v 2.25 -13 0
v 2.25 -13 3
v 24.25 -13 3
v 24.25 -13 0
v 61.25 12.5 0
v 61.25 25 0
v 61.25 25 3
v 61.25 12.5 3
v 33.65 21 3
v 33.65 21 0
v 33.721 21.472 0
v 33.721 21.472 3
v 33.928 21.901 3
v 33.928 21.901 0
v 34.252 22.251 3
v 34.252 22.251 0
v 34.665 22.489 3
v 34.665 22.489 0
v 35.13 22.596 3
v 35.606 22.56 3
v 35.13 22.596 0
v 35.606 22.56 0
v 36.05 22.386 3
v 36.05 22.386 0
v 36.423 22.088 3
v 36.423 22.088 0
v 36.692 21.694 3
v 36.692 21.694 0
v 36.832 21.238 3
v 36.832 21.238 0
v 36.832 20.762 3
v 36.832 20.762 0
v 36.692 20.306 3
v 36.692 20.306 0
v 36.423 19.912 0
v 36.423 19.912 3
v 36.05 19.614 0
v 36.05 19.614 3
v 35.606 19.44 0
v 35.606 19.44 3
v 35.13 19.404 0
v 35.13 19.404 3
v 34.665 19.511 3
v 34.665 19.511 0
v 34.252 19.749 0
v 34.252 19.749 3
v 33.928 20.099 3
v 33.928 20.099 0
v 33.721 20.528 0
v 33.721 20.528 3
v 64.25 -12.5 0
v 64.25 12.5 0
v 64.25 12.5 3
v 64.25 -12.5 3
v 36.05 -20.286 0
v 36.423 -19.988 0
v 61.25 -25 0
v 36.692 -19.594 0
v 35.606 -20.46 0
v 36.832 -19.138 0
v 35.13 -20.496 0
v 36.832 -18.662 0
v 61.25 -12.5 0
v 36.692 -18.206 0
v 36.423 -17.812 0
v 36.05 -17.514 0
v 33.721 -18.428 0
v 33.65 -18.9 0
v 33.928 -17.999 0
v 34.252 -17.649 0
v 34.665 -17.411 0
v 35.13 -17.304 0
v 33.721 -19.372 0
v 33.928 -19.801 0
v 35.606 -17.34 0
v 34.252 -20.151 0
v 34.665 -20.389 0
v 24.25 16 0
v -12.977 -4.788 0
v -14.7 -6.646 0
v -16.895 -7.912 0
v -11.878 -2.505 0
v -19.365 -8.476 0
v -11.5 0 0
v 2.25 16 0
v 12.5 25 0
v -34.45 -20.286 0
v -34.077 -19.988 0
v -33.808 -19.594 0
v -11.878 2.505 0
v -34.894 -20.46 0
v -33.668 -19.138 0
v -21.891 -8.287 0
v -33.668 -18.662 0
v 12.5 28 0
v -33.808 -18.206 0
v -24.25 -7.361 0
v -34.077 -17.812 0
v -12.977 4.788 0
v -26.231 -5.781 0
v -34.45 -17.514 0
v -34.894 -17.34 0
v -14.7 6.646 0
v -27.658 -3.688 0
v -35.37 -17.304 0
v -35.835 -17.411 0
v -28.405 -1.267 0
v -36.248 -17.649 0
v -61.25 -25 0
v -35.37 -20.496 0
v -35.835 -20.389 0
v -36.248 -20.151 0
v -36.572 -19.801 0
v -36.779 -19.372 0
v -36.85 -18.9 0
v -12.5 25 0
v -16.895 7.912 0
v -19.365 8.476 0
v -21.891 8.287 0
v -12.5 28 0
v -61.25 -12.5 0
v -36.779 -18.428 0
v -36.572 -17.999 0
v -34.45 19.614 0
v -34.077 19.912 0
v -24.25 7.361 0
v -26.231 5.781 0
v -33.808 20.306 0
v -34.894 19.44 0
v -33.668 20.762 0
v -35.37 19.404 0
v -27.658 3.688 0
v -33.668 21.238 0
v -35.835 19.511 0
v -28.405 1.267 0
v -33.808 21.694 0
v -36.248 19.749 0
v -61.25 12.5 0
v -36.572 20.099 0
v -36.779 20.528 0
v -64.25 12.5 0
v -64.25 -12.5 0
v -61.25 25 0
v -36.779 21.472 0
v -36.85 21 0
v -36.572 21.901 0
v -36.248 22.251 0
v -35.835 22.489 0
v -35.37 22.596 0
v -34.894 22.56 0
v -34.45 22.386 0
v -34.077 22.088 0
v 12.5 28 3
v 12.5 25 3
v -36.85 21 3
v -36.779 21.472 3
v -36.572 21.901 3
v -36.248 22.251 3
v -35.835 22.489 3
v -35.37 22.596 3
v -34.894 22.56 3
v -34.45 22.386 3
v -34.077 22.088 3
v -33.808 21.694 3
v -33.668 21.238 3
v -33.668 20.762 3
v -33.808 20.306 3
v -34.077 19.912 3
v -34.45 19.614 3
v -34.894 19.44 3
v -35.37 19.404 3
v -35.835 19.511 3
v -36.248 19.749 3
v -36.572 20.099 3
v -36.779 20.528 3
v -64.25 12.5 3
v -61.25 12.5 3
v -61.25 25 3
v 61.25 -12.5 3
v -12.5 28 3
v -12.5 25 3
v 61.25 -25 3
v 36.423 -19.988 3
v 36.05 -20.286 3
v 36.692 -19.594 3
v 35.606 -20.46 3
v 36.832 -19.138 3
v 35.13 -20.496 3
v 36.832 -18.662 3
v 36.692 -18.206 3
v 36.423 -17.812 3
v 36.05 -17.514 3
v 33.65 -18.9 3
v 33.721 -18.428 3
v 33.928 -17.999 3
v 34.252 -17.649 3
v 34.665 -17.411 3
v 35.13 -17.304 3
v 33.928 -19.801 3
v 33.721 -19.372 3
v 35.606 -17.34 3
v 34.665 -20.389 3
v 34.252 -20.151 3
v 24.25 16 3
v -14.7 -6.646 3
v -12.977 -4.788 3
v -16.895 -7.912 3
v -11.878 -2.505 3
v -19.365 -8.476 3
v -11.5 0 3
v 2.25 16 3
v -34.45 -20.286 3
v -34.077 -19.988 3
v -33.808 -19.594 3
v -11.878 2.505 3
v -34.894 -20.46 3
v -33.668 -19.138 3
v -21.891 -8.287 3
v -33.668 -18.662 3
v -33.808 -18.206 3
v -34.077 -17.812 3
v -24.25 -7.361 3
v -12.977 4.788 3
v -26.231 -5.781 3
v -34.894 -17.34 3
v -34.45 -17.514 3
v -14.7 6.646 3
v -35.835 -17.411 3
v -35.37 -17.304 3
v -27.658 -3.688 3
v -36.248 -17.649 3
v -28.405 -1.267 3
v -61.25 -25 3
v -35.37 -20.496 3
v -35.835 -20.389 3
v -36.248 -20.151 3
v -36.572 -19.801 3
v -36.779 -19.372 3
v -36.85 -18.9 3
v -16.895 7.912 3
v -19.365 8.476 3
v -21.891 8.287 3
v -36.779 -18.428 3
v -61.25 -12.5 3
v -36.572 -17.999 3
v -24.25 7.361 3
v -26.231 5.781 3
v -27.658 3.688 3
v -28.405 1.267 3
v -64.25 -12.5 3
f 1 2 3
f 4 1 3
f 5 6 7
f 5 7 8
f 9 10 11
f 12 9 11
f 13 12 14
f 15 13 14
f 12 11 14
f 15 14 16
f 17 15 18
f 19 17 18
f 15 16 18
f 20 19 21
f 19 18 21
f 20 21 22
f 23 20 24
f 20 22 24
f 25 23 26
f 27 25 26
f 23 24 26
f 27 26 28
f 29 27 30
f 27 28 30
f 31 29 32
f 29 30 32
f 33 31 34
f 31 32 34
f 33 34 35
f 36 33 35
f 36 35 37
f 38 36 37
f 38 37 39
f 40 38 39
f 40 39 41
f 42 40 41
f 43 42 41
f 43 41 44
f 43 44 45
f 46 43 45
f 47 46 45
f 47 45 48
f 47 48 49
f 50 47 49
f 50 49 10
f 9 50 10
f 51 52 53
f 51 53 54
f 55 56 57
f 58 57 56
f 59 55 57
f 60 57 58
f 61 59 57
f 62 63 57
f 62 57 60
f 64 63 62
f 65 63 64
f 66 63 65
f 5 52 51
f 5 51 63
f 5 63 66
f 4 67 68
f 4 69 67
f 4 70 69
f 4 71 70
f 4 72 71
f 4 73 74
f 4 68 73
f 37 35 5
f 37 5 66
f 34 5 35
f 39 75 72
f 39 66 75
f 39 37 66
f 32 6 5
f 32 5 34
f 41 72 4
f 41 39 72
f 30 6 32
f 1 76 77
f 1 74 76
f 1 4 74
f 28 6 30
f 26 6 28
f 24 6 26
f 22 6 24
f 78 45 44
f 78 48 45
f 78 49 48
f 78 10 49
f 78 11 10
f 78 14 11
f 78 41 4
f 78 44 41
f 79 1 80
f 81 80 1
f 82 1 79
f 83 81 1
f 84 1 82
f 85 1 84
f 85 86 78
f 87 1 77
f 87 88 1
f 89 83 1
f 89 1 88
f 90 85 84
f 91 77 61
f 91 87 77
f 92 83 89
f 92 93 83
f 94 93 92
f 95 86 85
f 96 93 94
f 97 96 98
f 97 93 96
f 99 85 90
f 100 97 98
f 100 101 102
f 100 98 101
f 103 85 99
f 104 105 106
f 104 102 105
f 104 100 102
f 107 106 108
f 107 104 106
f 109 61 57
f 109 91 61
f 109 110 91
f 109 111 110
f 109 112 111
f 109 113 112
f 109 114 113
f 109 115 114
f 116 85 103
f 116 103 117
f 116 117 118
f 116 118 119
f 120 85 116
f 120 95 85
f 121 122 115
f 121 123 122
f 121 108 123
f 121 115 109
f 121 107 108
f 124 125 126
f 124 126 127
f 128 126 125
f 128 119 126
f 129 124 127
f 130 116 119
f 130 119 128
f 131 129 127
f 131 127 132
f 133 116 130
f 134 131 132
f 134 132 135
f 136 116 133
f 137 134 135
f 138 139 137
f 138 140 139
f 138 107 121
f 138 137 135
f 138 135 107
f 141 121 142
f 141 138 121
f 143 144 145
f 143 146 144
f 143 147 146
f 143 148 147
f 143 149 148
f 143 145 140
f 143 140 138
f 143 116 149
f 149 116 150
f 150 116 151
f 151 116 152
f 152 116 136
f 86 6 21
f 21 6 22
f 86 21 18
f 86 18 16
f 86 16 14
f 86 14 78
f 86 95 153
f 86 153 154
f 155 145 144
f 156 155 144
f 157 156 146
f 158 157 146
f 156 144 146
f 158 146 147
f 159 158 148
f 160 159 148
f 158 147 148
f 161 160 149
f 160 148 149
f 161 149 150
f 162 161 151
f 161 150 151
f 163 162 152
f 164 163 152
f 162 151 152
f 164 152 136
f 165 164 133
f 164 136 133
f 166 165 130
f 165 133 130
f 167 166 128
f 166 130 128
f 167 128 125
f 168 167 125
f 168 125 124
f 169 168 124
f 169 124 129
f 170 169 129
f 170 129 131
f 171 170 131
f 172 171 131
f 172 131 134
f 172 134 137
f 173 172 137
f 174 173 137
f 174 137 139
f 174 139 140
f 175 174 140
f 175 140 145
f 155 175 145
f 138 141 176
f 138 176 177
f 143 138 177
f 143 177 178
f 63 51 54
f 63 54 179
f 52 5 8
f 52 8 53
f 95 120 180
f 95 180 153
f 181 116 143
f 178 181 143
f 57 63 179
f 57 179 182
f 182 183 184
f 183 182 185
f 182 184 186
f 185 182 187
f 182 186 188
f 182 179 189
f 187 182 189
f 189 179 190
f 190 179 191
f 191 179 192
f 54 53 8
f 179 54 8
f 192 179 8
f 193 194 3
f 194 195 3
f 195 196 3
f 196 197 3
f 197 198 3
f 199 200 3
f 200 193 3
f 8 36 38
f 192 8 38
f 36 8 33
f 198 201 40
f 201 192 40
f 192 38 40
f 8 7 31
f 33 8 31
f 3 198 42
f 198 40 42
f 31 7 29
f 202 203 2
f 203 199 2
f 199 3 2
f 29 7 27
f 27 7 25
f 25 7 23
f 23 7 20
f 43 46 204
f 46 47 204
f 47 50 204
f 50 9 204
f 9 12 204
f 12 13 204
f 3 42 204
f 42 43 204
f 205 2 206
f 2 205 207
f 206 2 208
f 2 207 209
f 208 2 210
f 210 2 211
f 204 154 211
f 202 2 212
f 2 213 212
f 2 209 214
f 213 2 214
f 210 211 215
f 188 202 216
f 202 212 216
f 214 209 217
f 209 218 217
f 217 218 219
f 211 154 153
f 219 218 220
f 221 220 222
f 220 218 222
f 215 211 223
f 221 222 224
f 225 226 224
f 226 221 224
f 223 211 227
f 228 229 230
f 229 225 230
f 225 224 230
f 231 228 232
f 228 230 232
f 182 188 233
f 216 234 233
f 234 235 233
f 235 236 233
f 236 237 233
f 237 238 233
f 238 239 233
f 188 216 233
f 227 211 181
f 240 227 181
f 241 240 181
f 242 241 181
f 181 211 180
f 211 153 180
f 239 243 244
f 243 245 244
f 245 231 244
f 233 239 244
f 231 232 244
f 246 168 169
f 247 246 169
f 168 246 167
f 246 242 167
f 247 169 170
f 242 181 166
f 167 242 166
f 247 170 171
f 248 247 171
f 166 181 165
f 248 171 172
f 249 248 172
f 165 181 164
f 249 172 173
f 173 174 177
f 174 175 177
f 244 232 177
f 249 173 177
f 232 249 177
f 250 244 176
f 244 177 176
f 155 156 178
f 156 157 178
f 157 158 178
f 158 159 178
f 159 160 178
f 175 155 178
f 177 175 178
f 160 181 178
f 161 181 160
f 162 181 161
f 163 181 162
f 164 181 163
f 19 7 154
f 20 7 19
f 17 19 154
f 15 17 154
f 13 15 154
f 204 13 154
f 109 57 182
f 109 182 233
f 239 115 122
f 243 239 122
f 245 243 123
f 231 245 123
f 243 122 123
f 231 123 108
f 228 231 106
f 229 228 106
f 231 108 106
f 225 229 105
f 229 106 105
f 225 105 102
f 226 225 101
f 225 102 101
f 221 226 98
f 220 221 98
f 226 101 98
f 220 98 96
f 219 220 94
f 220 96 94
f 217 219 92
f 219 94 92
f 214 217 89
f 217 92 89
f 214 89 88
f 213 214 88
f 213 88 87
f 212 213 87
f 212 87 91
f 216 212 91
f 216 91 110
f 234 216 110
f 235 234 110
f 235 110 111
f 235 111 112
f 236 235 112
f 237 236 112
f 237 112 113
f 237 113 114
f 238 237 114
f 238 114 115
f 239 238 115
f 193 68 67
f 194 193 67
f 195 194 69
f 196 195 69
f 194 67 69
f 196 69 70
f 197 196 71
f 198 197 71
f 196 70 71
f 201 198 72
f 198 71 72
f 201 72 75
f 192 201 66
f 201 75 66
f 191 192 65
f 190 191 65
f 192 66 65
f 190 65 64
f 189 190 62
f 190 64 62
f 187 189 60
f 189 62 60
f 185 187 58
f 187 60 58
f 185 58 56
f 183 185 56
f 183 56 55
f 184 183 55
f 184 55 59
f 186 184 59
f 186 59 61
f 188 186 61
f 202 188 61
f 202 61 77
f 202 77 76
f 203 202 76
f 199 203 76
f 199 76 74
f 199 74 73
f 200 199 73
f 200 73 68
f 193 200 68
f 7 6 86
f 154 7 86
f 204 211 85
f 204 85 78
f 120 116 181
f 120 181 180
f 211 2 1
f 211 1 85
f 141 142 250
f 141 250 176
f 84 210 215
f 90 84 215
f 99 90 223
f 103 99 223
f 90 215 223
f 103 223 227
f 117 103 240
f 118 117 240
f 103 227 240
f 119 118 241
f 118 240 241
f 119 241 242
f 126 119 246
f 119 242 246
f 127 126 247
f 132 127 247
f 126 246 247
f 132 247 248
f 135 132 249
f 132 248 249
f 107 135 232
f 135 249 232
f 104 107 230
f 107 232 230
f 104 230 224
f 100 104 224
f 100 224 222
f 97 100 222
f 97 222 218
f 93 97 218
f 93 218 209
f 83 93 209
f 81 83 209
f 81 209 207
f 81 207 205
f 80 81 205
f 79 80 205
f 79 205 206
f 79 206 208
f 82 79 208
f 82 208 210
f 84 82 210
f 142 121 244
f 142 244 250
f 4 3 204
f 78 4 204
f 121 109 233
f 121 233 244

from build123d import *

# Parameters (mm, degrees)
BOSS_EXTRU_1_DEPTH = 3
SKETCH1_R          = 1.6
CUT_EXTRUDE1_DEPTH = 71.150285103
SKETCH2_R          = 1.6
CUT_EXTRUDE2_DEPTH = 71.150285103
SKETCH3_R          = 1.6
CUT_EXTRUDE3_DEPTH = 71.150285103
SKETCH4_W          = 22
SKETCH4_H          = 29
CUT_EXTRUDE4_DEPTH = 71.150285103
SKETCH5_R          = 8.5
CUT_EXTRUDE5_DEPTH = 71.150285103


with BuildPart() as part:
    # Esquisse1 → Boss.-Extru.1 (new body)
    with BuildSketch(Plane.XY):
        Polygon((61.25, -25), (-61.25, -25), (-61.25, -12.5), (-64.25, -12.5), (-64.25, 12.5), (-61.25, 12.5), (-61.25, 25), (-29.85, 25), (-26.65, 25), (-12.5, 25), (-12.5, 28), (12.5, 28), (12.5, 25), (26.65, 25), (29.85, 25), (61.25, 25), (61.25, 12.5), (64.25, 12.5), (64.25, -12.5), (61.25, -12.5), align=None)
    extrude(amount=BOSS_EXTRU_1_DEPTH)

    # Sketch1 → Cut-Extrude1 (cut, through all)
    with BuildSketch(Plane(origin=(0, 0, 0), x_dir=(-1, 0, 0), z_dir=(0, 0, -1))):
        with Locations((35.25, 21)):
            Circle(SKETCH1_R)
    extrude(amount=-CUT_EXTRUDE1_DEPTH, mode=Mode.SUBTRACT)

    # Sketch2 → Cut-Extrude2 (cut, through all)
    with BuildSketch(Plane(origin=(0, 0, 0), x_dir=(-1, 0, 0), z_dir=(0, 0, -1))):
        with Locations((-35.25, 21)):
            Circle(SKETCH2_R)
    extrude(amount=-CUT_EXTRUDE2_DEPTH, mode=Mode.SUBTRACT)

    # Sketch3 → Cut-Extrude3 (cut, through all)
    with BuildSketch(Plane(origin=(0, 0, 0), x_dir=(-1, 0, 0), z_dir=(0, 0, -1))):
        with Locations((35.25, -18.9)):
            Circle(SKETCH3_R)
        with Locations((-35.25, -18.9)):
            Circle(SKETCH3_R)
    extrude(amount=-CUT_EXTRUDE3_DEPTH, mode=Mode.SUBTRACT)

    # Sketch4 → Cut-Extrude4 (cut, through all)
    with BuildSketch(Plane.XY.offset(3)):
        with Locations((13.25, 1.5)):
            Rectangle(SKETCH4_W, SKETCH4_H)
    extrude(amount=-CUT_EXTRUDE4_DEPTH, mode=Mode.SUBTRACT)

    # Sketch5 → Cut-Extrude5 (cut, through all)
    with BuildSketch(Plane.XY.offset(3)):
        with Locations((-20, 0)):
            Circle(SKETCH5_R)
    extrude(amount=-CUT_EXTRUDE5_DEPTH, mode=Mode.SUBTRACT)


solid = part.part
